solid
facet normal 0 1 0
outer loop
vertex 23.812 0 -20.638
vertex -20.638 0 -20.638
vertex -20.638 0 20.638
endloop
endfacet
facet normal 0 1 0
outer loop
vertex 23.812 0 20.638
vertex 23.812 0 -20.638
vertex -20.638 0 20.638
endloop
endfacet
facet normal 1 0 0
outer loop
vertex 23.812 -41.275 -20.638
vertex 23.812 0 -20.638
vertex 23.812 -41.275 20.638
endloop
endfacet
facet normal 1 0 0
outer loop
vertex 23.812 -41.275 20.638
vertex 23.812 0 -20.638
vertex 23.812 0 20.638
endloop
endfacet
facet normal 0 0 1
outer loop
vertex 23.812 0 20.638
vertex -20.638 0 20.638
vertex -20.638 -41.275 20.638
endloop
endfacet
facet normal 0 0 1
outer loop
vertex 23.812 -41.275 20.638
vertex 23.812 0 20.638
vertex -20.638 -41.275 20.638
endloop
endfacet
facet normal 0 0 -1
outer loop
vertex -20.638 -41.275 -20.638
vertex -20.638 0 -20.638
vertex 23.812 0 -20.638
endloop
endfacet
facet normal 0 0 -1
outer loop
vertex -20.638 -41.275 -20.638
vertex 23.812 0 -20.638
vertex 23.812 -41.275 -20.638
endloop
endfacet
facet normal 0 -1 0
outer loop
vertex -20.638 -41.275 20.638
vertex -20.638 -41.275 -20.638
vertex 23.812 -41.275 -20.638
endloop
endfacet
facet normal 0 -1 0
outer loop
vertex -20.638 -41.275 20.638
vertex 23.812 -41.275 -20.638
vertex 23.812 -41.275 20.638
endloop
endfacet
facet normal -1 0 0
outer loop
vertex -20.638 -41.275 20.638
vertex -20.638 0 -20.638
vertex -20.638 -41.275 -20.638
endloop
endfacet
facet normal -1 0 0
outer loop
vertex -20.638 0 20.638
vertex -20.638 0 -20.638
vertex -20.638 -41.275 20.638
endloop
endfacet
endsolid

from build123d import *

# Parameters (mm, degrees)
F0_W     = 41.275
F0_H     = 41.275
F1_DEPTH = 41.275
F2_DEPTH = 38.1
F3_DEPTH = 41.275
F4_DEPTH = 15.875


with BuildPart() as f1:
    # F0 (on Front) → F1 (new body)
    with BuildSketch(Plane.XZ):
        Rectangle(F0_W, F0_H)
    extrude(amount=F1_DEPTH)

    # F2 (cut): a face of the model
    f2_faces = [f1.faces().sort_by_distance(p)[0] for p in [
        (20.6375, -20.6375, 0),
    ]]
    extrude(f2_faces, amount=-F2_DEPTH, mode=Mode.SUBTRACT)

    # F3 (add): a face of the model
    f3_faces = [f1.faces().sort_by_distance(p)[0] for p in [
        (-17.4625, -20.6375, 0),
    ]]
    extrude(f3_faces, amount=F3_DEPTH)

    # F4 (add): a face of the model
    f4_faces = [f1.faces().sort_by_distance(p)[0] for p in [
        (23.8125, -20.6375, 0),
    ]]
    extrude(f4_faces, amount=-F4_DEPTH)


solid = f1.part
